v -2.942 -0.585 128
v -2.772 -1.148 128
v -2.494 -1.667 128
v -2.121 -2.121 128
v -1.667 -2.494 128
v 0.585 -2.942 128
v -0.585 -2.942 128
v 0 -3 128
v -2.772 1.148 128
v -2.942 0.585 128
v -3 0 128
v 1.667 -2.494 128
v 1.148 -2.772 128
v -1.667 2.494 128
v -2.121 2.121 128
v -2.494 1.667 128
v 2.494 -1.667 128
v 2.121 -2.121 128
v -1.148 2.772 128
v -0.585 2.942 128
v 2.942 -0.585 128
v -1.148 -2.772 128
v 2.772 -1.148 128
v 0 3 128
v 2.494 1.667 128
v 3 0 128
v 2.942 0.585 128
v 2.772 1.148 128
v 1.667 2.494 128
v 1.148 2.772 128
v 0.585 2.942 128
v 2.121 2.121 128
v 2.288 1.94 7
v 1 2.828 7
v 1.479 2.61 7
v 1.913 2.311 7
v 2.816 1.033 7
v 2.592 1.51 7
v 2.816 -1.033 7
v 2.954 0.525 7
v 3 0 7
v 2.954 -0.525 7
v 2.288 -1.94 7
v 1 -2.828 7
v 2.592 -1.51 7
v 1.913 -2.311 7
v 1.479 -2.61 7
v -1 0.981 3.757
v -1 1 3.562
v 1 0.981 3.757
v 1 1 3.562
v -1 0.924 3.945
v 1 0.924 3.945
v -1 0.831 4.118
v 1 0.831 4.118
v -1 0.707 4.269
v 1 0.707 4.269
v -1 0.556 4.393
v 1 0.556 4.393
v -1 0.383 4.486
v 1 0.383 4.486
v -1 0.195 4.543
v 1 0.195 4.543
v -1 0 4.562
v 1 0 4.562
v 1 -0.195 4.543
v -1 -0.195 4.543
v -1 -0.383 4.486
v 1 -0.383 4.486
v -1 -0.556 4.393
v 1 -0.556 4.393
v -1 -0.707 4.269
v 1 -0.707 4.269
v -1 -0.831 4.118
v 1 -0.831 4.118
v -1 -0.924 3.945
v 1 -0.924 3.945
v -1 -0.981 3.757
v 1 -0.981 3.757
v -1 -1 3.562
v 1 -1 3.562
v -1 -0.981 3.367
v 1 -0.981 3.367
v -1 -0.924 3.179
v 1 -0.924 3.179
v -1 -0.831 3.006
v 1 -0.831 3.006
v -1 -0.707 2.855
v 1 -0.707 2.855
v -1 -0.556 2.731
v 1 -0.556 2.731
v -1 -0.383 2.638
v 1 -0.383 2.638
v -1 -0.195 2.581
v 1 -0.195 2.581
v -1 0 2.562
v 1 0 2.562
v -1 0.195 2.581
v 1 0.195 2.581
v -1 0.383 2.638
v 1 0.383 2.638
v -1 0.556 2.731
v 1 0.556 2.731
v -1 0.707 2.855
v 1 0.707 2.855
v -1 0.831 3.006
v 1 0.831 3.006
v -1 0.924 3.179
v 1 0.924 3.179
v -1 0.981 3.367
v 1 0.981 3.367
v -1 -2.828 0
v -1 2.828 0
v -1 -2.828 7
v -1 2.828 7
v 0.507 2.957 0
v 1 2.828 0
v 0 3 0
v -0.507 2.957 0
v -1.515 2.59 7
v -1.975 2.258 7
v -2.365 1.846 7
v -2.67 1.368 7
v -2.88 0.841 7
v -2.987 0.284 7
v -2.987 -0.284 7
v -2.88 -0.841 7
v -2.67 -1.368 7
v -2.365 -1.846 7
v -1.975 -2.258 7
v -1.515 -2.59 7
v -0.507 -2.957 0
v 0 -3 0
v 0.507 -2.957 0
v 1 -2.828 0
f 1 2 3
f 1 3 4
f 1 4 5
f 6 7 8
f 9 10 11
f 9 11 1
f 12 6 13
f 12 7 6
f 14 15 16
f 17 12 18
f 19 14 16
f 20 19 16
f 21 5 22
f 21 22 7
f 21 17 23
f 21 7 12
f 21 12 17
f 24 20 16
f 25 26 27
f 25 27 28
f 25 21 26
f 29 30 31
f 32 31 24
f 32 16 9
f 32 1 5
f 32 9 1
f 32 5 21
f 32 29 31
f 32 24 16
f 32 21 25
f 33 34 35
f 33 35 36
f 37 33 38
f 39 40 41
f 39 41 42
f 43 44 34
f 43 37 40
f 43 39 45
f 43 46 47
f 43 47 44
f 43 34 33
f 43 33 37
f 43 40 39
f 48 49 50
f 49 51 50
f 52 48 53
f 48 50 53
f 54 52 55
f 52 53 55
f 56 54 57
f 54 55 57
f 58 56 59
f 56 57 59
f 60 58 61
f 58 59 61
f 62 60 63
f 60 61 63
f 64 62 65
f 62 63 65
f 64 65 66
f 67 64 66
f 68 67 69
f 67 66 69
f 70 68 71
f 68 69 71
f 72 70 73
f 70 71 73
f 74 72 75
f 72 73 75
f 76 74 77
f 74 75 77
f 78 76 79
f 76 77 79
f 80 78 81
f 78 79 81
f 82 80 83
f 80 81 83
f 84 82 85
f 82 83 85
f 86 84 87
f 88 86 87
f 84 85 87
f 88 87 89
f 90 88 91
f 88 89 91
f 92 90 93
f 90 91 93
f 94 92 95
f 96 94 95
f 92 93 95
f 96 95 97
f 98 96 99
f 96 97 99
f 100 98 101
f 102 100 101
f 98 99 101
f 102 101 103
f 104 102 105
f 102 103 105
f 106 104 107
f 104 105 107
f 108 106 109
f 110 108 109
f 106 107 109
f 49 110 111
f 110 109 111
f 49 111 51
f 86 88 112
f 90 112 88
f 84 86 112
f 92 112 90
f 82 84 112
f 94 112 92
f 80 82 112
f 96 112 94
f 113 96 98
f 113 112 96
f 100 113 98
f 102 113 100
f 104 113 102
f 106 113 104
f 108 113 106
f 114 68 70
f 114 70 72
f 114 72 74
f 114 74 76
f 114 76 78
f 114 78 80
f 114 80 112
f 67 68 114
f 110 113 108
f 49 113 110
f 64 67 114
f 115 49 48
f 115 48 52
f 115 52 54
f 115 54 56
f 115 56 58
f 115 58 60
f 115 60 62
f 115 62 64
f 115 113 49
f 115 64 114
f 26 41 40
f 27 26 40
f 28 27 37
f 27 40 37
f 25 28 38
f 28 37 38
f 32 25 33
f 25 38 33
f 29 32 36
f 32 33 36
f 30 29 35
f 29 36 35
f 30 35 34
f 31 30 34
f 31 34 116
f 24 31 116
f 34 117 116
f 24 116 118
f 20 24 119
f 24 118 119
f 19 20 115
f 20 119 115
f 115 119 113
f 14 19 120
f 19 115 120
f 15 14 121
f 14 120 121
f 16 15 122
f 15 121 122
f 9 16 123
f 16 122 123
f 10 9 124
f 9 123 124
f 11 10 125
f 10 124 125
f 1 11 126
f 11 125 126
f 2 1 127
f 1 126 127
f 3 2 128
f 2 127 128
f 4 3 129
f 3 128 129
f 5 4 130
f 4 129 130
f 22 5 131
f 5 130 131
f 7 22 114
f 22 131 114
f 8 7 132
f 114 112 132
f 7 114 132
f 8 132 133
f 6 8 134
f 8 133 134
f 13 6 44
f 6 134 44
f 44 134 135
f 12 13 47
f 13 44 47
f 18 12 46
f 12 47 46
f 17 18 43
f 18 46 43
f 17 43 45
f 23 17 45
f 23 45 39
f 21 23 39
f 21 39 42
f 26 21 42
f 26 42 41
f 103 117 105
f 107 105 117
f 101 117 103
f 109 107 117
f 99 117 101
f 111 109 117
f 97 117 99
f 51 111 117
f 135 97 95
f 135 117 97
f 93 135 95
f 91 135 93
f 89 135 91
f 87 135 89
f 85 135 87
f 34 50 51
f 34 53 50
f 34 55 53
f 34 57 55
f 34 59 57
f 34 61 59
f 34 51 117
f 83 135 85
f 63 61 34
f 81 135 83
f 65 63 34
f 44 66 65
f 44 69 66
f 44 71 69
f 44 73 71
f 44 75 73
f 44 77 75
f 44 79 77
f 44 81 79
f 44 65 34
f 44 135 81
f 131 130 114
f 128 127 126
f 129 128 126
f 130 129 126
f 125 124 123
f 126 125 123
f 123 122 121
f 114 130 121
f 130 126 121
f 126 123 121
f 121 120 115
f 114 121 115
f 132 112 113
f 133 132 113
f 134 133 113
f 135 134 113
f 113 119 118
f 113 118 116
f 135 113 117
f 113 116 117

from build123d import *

# Parameters (mm, degrees)
F0_R     = 3
F1_DEPTH = 128
F2_W     = 2
F2_H     = 7
F3_DEPTH = 12.5
F4_R     = 1
F5_DEPTH = 50


with BuildPart() as f1:
    # F0 (on Top) → F1 (new body)
    with BuildSketch(Plane.XY):
        Circle(F0_R)
    extrude(amount=F1_DEPTH)

    # F2 (on Front) → F3 (cut, symmetric)
    with BuildSketch(Plane.XZ):
        with Locations((-2, 3.5)):
            Rectangle(F2_W, F2_H)
        with Locations((2, 3.5)):
            Rectangle(F2_W, F2_H)
    extrude(amount=F3_DEPTH, both=True, mode=Mode.SUBTRACT)

    # F4 (on Right) → F5 (cut, symmetric)
    with BuildSketch(Plane.YZ):
        with Locations((0, 3.561988)):
            Circle(F4_R)
    extrude(amount=F5_DEPTH, both=True, mode=Mode.SUBTRACT)


solid = f1.part
